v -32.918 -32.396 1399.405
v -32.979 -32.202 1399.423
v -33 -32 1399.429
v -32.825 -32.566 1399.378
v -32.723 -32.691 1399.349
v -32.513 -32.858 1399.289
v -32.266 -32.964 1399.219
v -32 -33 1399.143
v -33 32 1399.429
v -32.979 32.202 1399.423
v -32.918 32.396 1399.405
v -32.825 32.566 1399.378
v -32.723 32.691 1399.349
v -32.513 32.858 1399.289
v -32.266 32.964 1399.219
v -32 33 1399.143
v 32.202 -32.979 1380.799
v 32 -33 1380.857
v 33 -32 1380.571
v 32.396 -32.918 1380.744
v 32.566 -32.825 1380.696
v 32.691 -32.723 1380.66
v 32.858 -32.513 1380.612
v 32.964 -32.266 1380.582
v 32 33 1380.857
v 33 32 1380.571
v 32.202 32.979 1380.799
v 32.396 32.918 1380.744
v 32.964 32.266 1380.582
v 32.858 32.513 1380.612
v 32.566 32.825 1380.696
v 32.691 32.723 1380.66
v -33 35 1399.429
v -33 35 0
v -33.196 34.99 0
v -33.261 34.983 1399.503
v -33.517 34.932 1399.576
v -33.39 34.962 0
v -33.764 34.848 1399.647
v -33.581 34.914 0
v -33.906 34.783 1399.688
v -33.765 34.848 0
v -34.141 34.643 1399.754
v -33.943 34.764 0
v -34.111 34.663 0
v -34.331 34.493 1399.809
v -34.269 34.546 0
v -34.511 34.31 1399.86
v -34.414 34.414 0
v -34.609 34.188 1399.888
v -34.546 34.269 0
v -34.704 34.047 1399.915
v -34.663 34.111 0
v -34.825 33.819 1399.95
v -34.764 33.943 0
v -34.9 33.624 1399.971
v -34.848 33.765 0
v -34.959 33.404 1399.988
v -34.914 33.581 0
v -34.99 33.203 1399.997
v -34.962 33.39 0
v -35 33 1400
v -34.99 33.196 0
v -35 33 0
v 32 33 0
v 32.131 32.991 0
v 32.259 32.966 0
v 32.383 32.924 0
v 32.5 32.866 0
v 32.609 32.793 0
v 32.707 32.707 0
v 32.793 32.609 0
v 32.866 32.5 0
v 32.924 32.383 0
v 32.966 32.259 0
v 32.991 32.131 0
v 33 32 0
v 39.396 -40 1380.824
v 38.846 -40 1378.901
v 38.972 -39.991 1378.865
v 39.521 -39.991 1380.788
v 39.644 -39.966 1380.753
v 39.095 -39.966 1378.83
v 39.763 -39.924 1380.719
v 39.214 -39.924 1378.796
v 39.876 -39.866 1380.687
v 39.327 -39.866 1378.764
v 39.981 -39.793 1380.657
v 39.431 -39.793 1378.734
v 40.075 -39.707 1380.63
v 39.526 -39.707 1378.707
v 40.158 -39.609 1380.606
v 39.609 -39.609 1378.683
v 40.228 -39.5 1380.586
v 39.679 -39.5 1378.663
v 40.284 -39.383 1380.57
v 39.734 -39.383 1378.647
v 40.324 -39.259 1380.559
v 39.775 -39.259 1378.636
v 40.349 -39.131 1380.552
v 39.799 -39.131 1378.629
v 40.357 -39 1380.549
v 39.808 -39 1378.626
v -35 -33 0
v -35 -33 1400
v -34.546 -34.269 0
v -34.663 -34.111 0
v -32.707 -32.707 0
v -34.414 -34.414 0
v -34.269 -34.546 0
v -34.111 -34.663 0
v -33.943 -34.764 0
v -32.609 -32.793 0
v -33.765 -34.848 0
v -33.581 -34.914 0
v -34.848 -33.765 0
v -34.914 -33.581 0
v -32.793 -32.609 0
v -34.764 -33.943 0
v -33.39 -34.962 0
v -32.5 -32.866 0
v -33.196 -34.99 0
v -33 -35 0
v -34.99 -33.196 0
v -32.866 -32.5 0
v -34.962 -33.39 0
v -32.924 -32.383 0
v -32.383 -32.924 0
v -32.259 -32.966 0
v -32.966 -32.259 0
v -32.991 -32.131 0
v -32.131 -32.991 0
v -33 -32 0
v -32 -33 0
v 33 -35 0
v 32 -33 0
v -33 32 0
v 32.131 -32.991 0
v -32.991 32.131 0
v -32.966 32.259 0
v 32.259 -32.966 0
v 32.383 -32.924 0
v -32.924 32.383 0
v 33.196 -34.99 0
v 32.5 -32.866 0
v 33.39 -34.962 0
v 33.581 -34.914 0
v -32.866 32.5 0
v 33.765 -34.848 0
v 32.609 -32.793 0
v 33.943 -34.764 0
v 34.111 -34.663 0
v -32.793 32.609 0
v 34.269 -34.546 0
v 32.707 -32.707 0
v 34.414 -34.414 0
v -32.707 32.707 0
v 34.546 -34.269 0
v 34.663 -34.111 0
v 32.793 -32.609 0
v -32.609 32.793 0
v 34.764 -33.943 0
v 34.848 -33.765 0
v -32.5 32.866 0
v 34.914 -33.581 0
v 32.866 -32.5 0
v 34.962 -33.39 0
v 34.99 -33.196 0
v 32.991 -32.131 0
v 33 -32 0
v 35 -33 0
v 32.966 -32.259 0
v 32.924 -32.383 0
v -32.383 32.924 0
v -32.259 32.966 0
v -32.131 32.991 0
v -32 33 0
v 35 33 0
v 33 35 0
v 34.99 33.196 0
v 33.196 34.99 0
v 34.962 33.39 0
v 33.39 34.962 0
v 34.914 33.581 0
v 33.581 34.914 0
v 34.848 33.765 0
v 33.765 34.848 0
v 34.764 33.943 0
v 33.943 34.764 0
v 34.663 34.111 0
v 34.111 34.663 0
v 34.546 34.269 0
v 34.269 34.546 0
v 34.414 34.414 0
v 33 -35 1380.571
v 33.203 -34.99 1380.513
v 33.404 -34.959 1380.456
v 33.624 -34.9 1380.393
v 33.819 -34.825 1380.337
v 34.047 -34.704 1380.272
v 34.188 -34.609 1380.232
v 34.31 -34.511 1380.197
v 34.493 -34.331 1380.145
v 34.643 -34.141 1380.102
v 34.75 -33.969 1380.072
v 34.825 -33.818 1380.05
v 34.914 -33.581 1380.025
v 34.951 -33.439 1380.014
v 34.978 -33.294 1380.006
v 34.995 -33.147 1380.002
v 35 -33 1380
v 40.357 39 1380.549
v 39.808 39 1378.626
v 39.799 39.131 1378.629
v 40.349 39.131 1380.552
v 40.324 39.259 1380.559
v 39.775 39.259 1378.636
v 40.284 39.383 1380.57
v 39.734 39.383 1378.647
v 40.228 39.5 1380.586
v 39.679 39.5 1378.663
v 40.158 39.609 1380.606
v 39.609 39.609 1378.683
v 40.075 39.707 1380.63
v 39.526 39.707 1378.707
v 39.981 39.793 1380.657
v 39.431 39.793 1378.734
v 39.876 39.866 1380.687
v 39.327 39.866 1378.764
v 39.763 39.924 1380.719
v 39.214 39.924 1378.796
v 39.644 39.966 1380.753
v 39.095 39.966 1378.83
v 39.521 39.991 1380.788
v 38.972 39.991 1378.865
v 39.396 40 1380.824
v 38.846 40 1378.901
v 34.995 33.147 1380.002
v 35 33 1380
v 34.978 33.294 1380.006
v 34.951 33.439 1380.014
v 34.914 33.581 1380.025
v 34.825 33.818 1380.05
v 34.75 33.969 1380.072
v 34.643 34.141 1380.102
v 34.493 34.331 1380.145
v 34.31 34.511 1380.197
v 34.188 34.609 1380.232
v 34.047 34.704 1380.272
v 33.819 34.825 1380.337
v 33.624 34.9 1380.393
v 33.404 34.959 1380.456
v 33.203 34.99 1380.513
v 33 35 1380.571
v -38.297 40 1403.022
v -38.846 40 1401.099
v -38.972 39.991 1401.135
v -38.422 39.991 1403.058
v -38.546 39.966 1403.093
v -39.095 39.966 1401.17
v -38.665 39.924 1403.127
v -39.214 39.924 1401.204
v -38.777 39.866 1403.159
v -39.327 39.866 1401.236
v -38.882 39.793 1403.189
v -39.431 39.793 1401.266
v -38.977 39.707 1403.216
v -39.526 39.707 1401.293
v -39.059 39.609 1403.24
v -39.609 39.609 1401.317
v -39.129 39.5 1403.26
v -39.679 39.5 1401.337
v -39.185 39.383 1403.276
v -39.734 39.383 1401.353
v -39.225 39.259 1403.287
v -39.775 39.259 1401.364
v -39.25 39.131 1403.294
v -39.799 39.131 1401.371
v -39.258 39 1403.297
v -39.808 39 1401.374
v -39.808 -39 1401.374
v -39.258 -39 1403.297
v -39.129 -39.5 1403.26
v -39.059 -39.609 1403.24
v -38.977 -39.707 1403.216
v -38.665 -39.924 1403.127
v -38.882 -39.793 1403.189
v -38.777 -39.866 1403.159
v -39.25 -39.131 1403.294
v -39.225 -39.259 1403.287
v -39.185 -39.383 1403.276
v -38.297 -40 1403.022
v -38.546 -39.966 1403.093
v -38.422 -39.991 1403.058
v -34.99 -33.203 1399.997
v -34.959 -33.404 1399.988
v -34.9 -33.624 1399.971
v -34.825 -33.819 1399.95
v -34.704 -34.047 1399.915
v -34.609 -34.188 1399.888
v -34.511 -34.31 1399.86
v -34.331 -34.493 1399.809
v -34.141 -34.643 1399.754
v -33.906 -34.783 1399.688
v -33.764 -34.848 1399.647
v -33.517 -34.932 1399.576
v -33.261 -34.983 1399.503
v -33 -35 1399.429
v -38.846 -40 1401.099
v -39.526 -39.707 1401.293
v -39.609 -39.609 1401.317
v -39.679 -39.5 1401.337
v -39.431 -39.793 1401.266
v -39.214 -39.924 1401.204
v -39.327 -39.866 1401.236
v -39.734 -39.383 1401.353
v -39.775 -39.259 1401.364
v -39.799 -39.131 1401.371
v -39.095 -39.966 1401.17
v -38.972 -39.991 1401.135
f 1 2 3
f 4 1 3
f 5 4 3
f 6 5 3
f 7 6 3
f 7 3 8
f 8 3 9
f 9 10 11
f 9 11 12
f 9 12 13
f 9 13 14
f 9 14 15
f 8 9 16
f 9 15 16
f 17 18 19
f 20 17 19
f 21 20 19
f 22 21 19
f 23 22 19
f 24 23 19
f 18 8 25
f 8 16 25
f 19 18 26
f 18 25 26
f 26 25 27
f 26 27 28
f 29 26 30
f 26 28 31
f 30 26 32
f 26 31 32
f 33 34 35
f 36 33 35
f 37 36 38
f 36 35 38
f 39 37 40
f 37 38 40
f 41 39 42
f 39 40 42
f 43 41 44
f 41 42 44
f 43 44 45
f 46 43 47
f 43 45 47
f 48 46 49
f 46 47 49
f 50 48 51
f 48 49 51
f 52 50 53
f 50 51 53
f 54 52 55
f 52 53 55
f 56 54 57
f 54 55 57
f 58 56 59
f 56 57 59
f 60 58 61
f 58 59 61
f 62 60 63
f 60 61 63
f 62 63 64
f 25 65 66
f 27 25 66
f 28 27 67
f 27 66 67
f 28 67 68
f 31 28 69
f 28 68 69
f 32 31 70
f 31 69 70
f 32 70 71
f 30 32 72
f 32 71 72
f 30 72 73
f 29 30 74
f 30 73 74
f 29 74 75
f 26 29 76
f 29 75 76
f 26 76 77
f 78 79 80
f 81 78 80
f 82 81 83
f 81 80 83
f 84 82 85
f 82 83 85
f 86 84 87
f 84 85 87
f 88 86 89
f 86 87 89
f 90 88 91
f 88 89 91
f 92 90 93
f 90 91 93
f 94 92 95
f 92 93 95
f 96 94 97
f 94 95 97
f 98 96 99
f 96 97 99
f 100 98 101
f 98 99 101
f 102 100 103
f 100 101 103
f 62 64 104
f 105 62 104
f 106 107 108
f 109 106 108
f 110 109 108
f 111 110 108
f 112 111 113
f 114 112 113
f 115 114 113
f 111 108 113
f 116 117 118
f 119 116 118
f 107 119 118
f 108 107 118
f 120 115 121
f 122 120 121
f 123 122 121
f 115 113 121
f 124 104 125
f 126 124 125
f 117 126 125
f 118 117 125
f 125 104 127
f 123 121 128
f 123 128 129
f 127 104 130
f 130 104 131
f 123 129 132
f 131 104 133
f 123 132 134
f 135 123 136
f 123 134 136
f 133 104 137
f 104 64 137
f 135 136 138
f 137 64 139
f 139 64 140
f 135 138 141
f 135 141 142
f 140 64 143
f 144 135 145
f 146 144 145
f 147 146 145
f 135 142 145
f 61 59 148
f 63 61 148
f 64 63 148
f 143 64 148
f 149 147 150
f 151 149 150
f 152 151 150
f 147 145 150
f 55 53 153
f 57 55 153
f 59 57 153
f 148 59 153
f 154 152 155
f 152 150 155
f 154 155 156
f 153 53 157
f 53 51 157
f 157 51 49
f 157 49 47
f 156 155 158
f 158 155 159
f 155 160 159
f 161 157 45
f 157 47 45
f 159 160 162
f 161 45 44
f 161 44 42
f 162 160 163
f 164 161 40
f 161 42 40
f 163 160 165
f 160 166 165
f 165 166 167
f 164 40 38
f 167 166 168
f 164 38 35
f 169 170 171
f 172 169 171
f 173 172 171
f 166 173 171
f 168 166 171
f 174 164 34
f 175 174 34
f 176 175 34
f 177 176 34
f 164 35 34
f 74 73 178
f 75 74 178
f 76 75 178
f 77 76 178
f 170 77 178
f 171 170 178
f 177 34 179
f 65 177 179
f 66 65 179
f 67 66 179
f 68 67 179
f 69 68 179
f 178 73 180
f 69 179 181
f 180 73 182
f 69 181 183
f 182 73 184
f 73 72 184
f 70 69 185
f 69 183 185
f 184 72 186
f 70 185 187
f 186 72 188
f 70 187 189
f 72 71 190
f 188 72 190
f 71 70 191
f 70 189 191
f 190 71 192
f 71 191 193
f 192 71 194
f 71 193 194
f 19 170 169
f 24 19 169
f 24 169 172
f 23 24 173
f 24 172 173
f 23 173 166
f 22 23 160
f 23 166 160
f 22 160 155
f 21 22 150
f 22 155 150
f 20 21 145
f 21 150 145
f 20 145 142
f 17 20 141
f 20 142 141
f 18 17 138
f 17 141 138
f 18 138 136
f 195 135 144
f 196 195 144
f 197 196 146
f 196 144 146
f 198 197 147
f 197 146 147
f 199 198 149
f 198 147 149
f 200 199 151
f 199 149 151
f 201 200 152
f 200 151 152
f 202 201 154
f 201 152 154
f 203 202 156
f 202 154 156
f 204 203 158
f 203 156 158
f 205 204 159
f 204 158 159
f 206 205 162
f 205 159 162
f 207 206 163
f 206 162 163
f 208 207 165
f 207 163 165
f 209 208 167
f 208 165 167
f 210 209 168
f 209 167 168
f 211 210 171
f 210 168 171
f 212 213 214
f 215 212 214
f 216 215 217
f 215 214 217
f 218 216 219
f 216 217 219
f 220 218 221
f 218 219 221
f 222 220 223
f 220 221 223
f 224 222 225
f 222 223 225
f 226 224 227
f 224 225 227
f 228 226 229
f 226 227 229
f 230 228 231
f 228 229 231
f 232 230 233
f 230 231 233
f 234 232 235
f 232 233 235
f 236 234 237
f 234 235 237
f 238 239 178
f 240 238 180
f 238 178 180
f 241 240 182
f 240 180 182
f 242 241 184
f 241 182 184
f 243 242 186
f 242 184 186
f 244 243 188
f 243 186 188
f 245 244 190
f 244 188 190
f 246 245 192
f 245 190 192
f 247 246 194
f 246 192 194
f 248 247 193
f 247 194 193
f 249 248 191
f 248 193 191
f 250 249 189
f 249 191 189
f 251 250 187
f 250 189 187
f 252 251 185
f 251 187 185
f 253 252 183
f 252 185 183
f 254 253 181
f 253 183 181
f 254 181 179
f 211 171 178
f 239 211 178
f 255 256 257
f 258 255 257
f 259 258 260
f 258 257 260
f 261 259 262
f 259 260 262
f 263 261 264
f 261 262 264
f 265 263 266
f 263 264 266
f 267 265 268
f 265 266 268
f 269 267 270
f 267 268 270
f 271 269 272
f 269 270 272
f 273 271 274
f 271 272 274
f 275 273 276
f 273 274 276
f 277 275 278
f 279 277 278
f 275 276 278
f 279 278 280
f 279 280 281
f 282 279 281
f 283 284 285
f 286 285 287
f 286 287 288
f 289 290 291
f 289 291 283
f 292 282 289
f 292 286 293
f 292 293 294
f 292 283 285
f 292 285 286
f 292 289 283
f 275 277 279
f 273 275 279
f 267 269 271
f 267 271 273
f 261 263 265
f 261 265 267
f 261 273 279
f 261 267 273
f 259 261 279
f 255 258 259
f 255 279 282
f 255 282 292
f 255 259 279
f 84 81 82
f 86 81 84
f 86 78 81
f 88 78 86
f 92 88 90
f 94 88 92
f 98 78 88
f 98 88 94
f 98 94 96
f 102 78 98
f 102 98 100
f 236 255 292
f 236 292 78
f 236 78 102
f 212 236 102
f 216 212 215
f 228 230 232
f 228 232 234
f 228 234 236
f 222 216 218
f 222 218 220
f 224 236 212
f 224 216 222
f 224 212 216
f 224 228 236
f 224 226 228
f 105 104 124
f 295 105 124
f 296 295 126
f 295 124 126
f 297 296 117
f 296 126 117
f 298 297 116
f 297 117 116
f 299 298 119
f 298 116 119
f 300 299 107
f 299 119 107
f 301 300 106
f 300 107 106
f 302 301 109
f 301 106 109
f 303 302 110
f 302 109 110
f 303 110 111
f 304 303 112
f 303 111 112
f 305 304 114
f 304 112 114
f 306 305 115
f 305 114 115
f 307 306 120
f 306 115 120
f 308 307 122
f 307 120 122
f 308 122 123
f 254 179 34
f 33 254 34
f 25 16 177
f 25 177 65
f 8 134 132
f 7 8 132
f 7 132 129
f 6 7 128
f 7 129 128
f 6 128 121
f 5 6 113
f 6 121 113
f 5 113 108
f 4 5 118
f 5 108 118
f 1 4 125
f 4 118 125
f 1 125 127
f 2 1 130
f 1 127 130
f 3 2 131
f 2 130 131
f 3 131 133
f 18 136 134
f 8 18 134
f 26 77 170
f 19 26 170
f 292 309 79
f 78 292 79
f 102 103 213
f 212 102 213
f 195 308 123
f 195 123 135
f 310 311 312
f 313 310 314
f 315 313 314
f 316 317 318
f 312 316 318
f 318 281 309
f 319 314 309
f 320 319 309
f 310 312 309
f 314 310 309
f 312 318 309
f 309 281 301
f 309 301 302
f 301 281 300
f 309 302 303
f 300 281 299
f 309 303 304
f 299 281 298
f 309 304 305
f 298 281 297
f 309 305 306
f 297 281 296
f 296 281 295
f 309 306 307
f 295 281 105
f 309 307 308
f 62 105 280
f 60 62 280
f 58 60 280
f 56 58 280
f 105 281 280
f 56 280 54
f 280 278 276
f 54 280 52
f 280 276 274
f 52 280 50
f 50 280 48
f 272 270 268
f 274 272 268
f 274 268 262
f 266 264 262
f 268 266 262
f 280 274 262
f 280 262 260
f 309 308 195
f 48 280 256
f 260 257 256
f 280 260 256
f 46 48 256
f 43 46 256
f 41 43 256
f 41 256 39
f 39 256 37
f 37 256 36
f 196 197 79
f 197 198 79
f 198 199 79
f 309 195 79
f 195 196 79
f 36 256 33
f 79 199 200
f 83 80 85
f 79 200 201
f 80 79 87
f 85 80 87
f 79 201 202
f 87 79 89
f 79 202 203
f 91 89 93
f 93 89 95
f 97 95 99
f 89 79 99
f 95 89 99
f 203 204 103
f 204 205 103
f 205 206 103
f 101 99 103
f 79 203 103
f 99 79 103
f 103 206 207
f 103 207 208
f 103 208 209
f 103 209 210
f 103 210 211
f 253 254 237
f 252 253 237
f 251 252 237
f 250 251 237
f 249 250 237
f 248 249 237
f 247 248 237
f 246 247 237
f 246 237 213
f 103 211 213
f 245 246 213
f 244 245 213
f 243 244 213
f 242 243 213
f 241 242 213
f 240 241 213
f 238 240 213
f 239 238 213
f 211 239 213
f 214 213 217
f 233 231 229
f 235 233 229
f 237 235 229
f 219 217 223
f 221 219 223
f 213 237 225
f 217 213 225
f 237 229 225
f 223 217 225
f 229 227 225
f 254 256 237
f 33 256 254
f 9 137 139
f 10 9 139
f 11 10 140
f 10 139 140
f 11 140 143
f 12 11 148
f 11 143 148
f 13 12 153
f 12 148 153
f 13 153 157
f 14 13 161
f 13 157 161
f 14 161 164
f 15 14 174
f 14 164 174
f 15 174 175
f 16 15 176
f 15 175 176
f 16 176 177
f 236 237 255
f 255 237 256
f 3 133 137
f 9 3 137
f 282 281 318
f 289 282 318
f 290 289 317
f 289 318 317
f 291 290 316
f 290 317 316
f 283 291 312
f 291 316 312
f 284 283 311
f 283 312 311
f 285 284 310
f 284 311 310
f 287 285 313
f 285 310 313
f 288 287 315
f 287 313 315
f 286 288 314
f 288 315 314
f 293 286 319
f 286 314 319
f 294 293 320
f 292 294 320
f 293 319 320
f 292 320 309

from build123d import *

# Parameters (mm, degrees)
F1_DEPTH      = 1400
F3_DEPTH      = 35
F3_DEPTH_BACK = 35
F6_DEPTH      = 2


with BuildPart() as f1:
    # F0 (on Top) → F1 (new body)
    with BuildSketch(Plane.XY):
        with BuildLine():
            ThreePointArc((-35, -33), (-34.4142135624, -34.4142135624), (-33, -35))
            Line((-33, -35), (33, -35))
            ThreePointArc((33, -35), (34.4142135624, -34.4142135624), (35, -33))
            Line((35, -33), (35, 33))
            ThreePointArc((35, 33), (34.4142135624, 34.4142135624), (33, 35))
            Line((33, 35), (-33, 35))
            ThreePointArc((-33, 35), (-34.4142135624, 34.4142135624), (-35, 33))
            Line((-35, 33), (-35, -33))
        make_face()
        with BuildLine():
            Line((32, -33), (-32, -33))
            ThreePointArc((-32, -33), (-32.7071067812, -32.7071067812), (-33, -32))
            Line((-33, -32), (-33, 32))
            ThreePointArc((-33, 32), (-32.7071067812, 32.7071067812), (-32, 33))
            Line((-32, 33), (32, 33))
            ThreePointArc((32, 33), (32.7071067812, 32.7071067812), (33, 32))
            Line((33, 32), (33, -32))
            ThreePointArc((33, -32), (32.7071067812, -32.7071067812), (32, -33))
        make_face(mode=Mode.SUBTRACT)
    extrude(amount=F1_DEPTH)

    # F2 (on Front) → F3 (cut, two sides)
    with BuildSketch(Plane.XZ) as f3_sk:
        Polygon((-35, 1400), (35, 1380), (35, 1400), align=None)
    extrude(amount=-F3_DEPTH, mode=Mode.SUBTRACT)
    extrude(f3_sk.sketch, amount=F3_DEPTH_BACK, mode=Mode.SUBTRACT)

    # F5 (on offset) → F6 (join)
    with BuildSketch(Plane(origin=(367.1698113208, 0, 1285.0943396226), x_dir=(0.9615239476, 0, -0.2747211279), z_dir=(0.2747211279, 0, 0.9615239476))):
        with BuildLine():
            Line((-341.461818331, 40), (-422.2629172238, 40))
            ThreePointArc((-422.2629172238, 40), (-422.9700240049, 39.7071067812), (-423.2629172238, 39))
            Line((-423.2629172238, 39), (-423.2629172238, -39))
            ThreePointArc((-423.2629172238, -39), (-422.9700240049, -39.7071067812), (-422.2629172238, -40))
            Line((-422.2629172238, -40), (-341.461818331, -40))
            ThreePointArc((-341.461818331, -40), (-340.7547115498, -39.7071067812), (-340.461818331, -39))
            Line((-340.461818331, -39), (-340.461818331, 39))
            ThreePointArc((-340.461818331, 39), (-340.7547115498, 39.7071067812), (-341.461818331, 40))
        make_face()
    extrude(amount=F6_DEPTH)


solid = f1.part
